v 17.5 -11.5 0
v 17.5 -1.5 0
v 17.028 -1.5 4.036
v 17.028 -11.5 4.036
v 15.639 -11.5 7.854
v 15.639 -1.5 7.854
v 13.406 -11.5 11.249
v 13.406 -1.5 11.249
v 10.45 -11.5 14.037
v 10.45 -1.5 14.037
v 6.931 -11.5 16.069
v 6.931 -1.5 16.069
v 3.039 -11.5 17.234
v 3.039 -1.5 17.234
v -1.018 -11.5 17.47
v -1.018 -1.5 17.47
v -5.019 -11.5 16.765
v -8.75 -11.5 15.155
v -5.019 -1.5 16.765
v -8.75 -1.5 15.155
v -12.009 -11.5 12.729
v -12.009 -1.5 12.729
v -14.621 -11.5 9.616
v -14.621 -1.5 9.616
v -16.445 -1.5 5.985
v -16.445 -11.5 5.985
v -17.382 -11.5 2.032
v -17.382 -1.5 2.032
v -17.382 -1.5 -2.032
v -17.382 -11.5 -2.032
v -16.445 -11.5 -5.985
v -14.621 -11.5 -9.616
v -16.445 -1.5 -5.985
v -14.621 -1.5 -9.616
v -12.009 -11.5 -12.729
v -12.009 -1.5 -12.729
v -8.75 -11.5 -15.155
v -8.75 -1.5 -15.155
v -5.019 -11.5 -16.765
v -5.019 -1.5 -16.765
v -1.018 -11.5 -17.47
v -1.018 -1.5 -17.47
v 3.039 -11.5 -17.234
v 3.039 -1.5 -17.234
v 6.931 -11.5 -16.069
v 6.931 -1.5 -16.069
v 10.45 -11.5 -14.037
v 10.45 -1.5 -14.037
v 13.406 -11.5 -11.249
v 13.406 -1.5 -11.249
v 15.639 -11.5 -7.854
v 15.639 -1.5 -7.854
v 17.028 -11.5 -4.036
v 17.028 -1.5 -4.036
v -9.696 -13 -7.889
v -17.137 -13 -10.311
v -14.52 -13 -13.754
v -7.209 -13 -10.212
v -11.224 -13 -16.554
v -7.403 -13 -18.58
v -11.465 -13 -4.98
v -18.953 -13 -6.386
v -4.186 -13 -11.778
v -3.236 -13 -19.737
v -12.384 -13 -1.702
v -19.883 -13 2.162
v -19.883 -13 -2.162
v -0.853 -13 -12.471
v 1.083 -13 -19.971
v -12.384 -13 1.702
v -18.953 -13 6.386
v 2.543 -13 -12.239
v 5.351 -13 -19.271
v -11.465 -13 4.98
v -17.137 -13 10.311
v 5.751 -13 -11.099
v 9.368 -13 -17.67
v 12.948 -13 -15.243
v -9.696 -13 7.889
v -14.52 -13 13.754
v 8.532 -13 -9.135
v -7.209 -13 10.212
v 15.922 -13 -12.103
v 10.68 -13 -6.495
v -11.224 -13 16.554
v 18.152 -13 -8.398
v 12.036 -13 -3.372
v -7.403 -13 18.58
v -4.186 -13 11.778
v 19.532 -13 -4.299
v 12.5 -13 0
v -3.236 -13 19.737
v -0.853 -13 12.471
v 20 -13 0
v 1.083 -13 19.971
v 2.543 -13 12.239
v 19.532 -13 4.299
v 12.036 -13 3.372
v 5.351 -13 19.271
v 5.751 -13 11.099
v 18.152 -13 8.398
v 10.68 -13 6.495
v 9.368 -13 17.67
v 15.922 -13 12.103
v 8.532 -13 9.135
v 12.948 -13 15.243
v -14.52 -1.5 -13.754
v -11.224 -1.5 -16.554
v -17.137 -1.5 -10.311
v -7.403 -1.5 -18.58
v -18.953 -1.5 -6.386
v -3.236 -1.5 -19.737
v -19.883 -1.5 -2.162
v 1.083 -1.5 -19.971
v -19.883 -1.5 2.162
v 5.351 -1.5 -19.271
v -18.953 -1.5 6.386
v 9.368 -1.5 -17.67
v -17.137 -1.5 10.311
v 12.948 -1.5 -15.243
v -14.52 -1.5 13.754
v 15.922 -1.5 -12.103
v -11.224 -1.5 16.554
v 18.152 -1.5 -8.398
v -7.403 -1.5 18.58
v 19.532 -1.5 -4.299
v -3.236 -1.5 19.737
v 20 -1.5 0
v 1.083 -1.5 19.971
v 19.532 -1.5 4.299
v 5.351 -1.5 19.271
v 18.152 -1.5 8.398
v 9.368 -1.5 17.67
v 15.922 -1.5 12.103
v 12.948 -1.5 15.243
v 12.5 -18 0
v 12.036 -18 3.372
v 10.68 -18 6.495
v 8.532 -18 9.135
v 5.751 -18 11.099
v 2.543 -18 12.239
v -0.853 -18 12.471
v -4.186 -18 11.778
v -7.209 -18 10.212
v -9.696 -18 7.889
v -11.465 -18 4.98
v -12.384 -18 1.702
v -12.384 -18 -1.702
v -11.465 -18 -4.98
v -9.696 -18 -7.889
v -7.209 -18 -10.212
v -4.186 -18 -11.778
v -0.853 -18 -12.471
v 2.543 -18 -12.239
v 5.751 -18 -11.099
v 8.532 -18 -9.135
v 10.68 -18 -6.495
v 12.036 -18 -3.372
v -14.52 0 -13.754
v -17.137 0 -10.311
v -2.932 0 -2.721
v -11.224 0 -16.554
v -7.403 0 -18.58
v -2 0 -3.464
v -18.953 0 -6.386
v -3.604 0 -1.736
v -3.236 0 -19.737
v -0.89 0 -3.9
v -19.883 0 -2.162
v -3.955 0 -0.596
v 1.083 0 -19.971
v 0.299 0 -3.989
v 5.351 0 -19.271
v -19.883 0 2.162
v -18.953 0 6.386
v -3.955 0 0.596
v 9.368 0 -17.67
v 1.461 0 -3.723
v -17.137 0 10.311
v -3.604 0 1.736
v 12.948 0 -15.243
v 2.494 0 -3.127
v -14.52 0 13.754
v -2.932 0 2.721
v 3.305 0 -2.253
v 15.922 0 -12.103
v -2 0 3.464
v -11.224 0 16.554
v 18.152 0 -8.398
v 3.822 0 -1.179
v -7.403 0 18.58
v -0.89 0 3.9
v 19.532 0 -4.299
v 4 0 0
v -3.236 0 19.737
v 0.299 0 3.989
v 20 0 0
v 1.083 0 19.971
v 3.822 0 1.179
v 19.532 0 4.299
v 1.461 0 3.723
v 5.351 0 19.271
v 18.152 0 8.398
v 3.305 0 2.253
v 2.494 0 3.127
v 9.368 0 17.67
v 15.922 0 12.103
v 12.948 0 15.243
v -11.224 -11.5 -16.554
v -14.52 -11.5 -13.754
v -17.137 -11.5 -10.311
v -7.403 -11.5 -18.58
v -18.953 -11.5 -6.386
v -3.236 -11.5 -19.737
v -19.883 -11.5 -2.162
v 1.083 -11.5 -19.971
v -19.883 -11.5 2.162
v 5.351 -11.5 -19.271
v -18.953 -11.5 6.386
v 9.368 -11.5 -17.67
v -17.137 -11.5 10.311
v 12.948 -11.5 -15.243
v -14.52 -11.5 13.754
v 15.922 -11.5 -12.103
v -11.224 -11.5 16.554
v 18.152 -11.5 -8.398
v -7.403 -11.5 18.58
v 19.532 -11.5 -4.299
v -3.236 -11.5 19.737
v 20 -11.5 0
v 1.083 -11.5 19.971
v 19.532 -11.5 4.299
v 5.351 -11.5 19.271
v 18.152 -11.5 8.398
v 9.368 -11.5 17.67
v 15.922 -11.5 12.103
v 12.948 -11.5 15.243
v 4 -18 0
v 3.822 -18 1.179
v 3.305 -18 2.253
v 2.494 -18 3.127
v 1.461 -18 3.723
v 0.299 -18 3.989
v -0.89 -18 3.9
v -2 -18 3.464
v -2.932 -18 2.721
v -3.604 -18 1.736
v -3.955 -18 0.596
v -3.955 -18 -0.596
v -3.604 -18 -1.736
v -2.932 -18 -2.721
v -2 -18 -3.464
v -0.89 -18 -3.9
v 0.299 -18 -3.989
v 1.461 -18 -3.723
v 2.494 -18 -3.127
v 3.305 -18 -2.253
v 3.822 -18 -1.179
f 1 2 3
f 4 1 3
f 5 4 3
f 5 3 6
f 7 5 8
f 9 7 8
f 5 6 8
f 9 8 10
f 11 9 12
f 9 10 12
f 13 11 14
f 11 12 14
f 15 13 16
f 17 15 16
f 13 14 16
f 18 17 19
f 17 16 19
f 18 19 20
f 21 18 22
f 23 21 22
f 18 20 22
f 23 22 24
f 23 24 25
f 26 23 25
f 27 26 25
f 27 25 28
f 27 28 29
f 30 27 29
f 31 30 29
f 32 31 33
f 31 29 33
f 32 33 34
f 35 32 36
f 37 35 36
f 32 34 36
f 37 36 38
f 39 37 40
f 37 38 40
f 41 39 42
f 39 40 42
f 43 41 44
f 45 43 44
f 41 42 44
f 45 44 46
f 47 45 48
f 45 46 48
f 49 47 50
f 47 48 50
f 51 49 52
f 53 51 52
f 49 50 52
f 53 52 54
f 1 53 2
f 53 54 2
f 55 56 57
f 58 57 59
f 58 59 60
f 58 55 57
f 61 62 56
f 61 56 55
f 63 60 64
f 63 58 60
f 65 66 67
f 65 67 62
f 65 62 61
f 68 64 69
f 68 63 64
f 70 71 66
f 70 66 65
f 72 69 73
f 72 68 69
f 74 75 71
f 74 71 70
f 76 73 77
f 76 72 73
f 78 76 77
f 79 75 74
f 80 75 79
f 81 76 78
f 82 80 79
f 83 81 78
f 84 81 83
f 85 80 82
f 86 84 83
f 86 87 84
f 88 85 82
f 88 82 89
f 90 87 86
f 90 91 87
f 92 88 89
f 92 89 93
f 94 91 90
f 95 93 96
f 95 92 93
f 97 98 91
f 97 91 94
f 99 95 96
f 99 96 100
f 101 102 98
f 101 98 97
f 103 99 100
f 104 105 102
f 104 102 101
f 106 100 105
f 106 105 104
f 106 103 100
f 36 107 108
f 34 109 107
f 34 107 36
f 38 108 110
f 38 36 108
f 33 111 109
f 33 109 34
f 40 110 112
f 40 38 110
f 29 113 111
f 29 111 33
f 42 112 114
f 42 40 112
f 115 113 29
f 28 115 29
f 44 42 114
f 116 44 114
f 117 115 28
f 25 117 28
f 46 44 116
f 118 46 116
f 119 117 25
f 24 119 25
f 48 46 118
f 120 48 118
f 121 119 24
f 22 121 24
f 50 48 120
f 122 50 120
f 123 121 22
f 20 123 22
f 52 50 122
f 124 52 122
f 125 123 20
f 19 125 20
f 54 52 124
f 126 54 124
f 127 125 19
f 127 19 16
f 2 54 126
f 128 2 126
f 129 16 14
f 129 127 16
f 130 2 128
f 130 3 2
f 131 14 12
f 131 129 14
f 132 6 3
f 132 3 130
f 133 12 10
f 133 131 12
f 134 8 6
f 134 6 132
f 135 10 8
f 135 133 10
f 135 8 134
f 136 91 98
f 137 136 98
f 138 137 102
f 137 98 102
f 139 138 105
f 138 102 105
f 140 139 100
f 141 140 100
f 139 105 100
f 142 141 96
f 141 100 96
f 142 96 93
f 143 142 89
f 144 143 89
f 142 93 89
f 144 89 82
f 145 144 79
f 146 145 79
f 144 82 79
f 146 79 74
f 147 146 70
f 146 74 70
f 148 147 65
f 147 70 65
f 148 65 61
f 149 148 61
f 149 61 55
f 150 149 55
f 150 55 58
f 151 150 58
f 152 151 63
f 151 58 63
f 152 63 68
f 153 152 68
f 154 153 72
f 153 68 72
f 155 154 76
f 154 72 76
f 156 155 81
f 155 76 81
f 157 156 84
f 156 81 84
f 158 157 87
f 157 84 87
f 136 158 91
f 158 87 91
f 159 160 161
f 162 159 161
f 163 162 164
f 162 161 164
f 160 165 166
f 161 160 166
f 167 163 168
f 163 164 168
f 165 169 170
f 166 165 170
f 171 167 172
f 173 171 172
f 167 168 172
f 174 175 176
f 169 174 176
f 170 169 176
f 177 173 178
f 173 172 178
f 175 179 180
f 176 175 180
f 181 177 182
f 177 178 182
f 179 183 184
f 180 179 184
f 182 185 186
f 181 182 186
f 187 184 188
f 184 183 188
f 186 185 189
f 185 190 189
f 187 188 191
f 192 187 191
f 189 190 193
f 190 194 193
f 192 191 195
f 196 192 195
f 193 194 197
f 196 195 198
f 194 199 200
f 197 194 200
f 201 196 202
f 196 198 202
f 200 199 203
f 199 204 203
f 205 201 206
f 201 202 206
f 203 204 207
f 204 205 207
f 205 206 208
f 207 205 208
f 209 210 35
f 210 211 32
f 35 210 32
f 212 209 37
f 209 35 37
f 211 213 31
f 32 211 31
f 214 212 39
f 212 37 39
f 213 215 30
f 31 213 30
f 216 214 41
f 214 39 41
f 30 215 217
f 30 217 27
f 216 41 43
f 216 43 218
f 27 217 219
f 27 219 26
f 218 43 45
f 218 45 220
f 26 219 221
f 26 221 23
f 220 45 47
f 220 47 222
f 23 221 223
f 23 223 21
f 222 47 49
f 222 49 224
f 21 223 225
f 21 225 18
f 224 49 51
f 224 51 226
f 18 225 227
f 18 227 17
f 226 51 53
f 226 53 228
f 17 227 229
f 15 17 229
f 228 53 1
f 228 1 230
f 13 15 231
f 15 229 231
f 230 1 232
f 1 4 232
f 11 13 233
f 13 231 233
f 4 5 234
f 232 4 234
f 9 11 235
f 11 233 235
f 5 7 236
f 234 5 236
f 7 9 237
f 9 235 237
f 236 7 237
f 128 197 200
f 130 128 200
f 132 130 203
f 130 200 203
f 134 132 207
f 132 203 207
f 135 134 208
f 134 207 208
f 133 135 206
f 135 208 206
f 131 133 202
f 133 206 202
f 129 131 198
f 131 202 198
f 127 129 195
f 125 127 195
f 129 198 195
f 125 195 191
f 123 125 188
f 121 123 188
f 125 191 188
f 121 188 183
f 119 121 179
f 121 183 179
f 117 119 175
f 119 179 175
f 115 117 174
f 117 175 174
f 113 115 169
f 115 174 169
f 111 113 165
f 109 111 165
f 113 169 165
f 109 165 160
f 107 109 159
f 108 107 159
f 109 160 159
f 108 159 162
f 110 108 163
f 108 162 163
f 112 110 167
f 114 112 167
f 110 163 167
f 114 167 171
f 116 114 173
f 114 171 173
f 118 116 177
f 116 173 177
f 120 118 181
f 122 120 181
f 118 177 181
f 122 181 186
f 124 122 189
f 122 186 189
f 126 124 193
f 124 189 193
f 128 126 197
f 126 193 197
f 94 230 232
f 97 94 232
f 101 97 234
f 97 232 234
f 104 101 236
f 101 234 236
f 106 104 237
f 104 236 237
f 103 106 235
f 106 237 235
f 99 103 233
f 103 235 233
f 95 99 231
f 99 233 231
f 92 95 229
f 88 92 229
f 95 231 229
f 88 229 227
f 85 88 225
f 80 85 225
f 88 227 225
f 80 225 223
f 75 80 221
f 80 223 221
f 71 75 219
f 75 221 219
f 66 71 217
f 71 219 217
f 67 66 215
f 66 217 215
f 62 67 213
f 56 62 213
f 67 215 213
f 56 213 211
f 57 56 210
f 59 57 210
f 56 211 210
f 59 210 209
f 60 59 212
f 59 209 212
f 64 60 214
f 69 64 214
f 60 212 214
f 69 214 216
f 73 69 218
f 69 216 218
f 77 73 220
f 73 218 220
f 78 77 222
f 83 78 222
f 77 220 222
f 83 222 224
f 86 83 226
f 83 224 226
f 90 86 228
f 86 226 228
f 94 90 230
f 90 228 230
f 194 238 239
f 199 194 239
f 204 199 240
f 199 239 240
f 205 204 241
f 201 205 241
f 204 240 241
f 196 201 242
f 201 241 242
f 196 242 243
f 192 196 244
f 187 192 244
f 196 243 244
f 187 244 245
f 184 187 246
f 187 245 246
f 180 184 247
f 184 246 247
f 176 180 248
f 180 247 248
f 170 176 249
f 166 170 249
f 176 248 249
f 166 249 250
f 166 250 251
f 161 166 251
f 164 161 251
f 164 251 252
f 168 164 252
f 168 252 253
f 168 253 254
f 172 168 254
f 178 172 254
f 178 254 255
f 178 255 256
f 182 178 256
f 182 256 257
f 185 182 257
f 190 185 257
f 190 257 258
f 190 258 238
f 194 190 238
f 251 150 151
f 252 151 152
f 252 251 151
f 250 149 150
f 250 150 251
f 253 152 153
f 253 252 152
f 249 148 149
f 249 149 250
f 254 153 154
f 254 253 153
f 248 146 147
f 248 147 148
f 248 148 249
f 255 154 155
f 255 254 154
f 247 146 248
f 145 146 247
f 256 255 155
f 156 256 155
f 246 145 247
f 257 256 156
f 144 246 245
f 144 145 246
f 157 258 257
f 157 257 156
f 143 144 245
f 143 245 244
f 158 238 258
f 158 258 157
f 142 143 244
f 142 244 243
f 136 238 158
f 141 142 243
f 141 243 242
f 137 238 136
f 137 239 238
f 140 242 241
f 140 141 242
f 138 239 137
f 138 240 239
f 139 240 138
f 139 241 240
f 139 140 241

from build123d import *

# Parameters (mm, degrees)
F0_R     = 20
F1_DEPTH = 1.5
F2_R     = 17.5
F3_DEPTH = 10
F4_R     = 20
F5_DEPTH = 1.5
F6_R     = 12.5
F7_DEPTH = 5
F8_R     = 4
F9_DEPTH = 20


with BuildPart() as f1:
    # F0 (on Front) → F1 (new body)
    with BuildSketch(Plane.XZ):
        Circle(F0_R)
    extrude(amount=F1_DEPTH)

    # F2 (on face) → F3 (join)
    with BuildSketch(Plane.XZ.offset(1.5)):
        Circle(F2_R)
    extrude(amount=F3_DEPTH)

    # F4 (on face) → F5 (join)
    with BuildSketch(Plane.XZ.offset(11.5)):
        Circle(F4_R)
    extrude(amount=F5_DEPTH)

    # F6 (on face) → F7 (join)
    with BuildSketch(Plane.XZ.offset(13)):
        Circle(F6_R)
    extrude(amount=F7_DEPTH)

    # F8 (on face) → F9 (cut)
    with BuildSketch(Plane.XZ.offset(18)):
        Circle(F8_R)
    extrude(amount=-F9_DEPTH, mode=Mode.SUBTRACT)


solid = f1.part
